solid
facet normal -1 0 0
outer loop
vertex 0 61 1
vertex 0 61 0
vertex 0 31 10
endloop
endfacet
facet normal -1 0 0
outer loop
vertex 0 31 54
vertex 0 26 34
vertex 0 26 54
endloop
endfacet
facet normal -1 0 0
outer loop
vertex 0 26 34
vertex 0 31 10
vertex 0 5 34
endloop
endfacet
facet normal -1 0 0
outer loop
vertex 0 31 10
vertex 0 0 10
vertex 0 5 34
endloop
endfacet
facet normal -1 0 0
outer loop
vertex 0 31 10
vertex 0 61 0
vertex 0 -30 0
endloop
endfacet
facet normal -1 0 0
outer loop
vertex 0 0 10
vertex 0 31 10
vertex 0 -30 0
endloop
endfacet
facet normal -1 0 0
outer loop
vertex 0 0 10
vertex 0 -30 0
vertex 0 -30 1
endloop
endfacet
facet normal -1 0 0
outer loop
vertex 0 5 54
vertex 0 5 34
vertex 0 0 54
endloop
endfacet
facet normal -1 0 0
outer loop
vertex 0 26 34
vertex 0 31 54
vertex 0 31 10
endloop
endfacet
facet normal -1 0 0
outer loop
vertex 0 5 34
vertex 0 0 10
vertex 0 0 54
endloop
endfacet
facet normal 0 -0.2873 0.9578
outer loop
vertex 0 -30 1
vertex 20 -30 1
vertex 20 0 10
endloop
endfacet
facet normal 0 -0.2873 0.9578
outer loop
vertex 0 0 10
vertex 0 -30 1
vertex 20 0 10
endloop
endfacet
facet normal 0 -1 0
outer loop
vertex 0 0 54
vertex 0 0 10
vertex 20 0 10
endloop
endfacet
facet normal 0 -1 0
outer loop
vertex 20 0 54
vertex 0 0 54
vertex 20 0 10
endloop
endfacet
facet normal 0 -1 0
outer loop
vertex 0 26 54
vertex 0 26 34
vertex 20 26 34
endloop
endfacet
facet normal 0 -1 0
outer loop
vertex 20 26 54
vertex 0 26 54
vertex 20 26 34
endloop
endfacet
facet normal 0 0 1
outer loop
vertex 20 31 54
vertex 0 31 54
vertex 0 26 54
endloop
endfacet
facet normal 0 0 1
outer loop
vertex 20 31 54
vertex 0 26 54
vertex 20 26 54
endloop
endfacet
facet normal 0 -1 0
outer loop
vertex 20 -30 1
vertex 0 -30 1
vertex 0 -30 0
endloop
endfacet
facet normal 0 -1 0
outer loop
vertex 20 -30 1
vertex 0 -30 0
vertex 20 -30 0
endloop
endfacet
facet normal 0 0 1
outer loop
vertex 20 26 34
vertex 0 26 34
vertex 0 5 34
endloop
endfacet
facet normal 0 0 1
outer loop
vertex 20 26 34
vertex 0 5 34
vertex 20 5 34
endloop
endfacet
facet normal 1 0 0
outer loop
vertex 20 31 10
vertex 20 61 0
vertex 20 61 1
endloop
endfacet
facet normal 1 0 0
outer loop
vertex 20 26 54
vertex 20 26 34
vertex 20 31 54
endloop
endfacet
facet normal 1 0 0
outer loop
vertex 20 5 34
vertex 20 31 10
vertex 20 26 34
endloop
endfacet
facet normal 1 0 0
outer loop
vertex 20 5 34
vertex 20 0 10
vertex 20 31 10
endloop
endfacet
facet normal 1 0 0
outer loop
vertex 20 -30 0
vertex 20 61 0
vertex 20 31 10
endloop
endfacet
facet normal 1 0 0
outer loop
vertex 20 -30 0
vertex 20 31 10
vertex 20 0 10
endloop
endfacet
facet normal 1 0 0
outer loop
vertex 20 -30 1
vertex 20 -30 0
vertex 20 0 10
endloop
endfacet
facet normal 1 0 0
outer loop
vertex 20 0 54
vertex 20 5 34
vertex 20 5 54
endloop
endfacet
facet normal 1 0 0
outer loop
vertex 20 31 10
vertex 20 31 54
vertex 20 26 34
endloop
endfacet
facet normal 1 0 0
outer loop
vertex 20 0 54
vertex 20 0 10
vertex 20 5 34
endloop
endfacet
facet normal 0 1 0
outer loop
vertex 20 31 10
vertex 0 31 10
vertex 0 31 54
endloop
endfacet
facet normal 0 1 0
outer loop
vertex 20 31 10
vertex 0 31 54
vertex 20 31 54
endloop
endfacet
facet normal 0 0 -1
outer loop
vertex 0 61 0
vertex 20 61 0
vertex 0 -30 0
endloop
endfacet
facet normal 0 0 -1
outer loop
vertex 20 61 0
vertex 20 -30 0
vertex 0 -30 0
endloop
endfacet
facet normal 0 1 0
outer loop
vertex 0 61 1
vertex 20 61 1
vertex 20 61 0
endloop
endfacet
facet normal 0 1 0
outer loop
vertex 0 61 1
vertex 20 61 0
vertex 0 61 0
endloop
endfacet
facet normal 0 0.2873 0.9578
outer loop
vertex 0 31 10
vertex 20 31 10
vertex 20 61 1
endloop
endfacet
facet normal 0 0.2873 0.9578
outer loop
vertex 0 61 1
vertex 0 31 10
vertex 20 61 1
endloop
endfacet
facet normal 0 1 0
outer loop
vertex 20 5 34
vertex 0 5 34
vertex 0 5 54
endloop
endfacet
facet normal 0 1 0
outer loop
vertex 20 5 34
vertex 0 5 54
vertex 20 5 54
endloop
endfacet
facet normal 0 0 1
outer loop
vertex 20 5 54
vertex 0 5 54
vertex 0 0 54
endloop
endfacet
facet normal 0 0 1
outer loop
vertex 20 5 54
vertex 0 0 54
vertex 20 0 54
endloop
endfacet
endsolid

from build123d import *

# Parameters (mm, degrees)
F0_W     = 20
F0_H     = 31
F1_DEPTH = 34
F2_W     = 20
F2_H     = 5
F3_DEPTH = 20
F4_W     = 20
F4_H     = 10
F5_DEPTH = 30
F6_W     = 20
F6_H     = 10
F7_DEPTH = 30
F9_DEPTH = 20


with BuildPart() as f1:
    # F0 (on Top) → F1 (new body)
    with BuildSketch(Plane.XY):
        with Locations((10, 15.5)):
            Rectangle(F0_W, F0_H)
    extrude(amount=F1_DEPTH)

    # F2 (on face) → F3 (join)
    with BuildSketch(Plane.XY.offset(34)):
        with Locations((10, 28.5)):
            Rectangle(F2_W, F2_H)
        with Locations((10, 2.5)):
            Rectangle(F2_W, F2_H)
    extrude(amount=F3_DEPTH)

    # F4 (on face) → F5 (join)
    with BuildSketch(Plane.XZ):
        with Locations((10, 5)):
            Rectangle(F4_W, F4_H)
    extrude(amount=F5_DEPTH)

    # F6 (on face) → F7 (join)
    with BuildSketch(Plane(origin=(0, 31, 0), x_dir=(-1, 0, 0), z_dir=(0, 1, 0))):
        with Locations((-10, 5)):
            Rectangle(F6_W, F6_H)
    extrude(amount=F7_DEPTH)

    # F8 (on face) → F9 (cut)
    with BuildSketch(Plane.YZ.offset(20)):
        Polygon((-30, 1), (0, 10), (-30, 10), align=None)
        Polygon((31, 10), (61, 1), (61, 10), align=None)
    extrude(amount=-F9_DEPTH, mode=Mode.SUBTRACT)


solid = f1.part
